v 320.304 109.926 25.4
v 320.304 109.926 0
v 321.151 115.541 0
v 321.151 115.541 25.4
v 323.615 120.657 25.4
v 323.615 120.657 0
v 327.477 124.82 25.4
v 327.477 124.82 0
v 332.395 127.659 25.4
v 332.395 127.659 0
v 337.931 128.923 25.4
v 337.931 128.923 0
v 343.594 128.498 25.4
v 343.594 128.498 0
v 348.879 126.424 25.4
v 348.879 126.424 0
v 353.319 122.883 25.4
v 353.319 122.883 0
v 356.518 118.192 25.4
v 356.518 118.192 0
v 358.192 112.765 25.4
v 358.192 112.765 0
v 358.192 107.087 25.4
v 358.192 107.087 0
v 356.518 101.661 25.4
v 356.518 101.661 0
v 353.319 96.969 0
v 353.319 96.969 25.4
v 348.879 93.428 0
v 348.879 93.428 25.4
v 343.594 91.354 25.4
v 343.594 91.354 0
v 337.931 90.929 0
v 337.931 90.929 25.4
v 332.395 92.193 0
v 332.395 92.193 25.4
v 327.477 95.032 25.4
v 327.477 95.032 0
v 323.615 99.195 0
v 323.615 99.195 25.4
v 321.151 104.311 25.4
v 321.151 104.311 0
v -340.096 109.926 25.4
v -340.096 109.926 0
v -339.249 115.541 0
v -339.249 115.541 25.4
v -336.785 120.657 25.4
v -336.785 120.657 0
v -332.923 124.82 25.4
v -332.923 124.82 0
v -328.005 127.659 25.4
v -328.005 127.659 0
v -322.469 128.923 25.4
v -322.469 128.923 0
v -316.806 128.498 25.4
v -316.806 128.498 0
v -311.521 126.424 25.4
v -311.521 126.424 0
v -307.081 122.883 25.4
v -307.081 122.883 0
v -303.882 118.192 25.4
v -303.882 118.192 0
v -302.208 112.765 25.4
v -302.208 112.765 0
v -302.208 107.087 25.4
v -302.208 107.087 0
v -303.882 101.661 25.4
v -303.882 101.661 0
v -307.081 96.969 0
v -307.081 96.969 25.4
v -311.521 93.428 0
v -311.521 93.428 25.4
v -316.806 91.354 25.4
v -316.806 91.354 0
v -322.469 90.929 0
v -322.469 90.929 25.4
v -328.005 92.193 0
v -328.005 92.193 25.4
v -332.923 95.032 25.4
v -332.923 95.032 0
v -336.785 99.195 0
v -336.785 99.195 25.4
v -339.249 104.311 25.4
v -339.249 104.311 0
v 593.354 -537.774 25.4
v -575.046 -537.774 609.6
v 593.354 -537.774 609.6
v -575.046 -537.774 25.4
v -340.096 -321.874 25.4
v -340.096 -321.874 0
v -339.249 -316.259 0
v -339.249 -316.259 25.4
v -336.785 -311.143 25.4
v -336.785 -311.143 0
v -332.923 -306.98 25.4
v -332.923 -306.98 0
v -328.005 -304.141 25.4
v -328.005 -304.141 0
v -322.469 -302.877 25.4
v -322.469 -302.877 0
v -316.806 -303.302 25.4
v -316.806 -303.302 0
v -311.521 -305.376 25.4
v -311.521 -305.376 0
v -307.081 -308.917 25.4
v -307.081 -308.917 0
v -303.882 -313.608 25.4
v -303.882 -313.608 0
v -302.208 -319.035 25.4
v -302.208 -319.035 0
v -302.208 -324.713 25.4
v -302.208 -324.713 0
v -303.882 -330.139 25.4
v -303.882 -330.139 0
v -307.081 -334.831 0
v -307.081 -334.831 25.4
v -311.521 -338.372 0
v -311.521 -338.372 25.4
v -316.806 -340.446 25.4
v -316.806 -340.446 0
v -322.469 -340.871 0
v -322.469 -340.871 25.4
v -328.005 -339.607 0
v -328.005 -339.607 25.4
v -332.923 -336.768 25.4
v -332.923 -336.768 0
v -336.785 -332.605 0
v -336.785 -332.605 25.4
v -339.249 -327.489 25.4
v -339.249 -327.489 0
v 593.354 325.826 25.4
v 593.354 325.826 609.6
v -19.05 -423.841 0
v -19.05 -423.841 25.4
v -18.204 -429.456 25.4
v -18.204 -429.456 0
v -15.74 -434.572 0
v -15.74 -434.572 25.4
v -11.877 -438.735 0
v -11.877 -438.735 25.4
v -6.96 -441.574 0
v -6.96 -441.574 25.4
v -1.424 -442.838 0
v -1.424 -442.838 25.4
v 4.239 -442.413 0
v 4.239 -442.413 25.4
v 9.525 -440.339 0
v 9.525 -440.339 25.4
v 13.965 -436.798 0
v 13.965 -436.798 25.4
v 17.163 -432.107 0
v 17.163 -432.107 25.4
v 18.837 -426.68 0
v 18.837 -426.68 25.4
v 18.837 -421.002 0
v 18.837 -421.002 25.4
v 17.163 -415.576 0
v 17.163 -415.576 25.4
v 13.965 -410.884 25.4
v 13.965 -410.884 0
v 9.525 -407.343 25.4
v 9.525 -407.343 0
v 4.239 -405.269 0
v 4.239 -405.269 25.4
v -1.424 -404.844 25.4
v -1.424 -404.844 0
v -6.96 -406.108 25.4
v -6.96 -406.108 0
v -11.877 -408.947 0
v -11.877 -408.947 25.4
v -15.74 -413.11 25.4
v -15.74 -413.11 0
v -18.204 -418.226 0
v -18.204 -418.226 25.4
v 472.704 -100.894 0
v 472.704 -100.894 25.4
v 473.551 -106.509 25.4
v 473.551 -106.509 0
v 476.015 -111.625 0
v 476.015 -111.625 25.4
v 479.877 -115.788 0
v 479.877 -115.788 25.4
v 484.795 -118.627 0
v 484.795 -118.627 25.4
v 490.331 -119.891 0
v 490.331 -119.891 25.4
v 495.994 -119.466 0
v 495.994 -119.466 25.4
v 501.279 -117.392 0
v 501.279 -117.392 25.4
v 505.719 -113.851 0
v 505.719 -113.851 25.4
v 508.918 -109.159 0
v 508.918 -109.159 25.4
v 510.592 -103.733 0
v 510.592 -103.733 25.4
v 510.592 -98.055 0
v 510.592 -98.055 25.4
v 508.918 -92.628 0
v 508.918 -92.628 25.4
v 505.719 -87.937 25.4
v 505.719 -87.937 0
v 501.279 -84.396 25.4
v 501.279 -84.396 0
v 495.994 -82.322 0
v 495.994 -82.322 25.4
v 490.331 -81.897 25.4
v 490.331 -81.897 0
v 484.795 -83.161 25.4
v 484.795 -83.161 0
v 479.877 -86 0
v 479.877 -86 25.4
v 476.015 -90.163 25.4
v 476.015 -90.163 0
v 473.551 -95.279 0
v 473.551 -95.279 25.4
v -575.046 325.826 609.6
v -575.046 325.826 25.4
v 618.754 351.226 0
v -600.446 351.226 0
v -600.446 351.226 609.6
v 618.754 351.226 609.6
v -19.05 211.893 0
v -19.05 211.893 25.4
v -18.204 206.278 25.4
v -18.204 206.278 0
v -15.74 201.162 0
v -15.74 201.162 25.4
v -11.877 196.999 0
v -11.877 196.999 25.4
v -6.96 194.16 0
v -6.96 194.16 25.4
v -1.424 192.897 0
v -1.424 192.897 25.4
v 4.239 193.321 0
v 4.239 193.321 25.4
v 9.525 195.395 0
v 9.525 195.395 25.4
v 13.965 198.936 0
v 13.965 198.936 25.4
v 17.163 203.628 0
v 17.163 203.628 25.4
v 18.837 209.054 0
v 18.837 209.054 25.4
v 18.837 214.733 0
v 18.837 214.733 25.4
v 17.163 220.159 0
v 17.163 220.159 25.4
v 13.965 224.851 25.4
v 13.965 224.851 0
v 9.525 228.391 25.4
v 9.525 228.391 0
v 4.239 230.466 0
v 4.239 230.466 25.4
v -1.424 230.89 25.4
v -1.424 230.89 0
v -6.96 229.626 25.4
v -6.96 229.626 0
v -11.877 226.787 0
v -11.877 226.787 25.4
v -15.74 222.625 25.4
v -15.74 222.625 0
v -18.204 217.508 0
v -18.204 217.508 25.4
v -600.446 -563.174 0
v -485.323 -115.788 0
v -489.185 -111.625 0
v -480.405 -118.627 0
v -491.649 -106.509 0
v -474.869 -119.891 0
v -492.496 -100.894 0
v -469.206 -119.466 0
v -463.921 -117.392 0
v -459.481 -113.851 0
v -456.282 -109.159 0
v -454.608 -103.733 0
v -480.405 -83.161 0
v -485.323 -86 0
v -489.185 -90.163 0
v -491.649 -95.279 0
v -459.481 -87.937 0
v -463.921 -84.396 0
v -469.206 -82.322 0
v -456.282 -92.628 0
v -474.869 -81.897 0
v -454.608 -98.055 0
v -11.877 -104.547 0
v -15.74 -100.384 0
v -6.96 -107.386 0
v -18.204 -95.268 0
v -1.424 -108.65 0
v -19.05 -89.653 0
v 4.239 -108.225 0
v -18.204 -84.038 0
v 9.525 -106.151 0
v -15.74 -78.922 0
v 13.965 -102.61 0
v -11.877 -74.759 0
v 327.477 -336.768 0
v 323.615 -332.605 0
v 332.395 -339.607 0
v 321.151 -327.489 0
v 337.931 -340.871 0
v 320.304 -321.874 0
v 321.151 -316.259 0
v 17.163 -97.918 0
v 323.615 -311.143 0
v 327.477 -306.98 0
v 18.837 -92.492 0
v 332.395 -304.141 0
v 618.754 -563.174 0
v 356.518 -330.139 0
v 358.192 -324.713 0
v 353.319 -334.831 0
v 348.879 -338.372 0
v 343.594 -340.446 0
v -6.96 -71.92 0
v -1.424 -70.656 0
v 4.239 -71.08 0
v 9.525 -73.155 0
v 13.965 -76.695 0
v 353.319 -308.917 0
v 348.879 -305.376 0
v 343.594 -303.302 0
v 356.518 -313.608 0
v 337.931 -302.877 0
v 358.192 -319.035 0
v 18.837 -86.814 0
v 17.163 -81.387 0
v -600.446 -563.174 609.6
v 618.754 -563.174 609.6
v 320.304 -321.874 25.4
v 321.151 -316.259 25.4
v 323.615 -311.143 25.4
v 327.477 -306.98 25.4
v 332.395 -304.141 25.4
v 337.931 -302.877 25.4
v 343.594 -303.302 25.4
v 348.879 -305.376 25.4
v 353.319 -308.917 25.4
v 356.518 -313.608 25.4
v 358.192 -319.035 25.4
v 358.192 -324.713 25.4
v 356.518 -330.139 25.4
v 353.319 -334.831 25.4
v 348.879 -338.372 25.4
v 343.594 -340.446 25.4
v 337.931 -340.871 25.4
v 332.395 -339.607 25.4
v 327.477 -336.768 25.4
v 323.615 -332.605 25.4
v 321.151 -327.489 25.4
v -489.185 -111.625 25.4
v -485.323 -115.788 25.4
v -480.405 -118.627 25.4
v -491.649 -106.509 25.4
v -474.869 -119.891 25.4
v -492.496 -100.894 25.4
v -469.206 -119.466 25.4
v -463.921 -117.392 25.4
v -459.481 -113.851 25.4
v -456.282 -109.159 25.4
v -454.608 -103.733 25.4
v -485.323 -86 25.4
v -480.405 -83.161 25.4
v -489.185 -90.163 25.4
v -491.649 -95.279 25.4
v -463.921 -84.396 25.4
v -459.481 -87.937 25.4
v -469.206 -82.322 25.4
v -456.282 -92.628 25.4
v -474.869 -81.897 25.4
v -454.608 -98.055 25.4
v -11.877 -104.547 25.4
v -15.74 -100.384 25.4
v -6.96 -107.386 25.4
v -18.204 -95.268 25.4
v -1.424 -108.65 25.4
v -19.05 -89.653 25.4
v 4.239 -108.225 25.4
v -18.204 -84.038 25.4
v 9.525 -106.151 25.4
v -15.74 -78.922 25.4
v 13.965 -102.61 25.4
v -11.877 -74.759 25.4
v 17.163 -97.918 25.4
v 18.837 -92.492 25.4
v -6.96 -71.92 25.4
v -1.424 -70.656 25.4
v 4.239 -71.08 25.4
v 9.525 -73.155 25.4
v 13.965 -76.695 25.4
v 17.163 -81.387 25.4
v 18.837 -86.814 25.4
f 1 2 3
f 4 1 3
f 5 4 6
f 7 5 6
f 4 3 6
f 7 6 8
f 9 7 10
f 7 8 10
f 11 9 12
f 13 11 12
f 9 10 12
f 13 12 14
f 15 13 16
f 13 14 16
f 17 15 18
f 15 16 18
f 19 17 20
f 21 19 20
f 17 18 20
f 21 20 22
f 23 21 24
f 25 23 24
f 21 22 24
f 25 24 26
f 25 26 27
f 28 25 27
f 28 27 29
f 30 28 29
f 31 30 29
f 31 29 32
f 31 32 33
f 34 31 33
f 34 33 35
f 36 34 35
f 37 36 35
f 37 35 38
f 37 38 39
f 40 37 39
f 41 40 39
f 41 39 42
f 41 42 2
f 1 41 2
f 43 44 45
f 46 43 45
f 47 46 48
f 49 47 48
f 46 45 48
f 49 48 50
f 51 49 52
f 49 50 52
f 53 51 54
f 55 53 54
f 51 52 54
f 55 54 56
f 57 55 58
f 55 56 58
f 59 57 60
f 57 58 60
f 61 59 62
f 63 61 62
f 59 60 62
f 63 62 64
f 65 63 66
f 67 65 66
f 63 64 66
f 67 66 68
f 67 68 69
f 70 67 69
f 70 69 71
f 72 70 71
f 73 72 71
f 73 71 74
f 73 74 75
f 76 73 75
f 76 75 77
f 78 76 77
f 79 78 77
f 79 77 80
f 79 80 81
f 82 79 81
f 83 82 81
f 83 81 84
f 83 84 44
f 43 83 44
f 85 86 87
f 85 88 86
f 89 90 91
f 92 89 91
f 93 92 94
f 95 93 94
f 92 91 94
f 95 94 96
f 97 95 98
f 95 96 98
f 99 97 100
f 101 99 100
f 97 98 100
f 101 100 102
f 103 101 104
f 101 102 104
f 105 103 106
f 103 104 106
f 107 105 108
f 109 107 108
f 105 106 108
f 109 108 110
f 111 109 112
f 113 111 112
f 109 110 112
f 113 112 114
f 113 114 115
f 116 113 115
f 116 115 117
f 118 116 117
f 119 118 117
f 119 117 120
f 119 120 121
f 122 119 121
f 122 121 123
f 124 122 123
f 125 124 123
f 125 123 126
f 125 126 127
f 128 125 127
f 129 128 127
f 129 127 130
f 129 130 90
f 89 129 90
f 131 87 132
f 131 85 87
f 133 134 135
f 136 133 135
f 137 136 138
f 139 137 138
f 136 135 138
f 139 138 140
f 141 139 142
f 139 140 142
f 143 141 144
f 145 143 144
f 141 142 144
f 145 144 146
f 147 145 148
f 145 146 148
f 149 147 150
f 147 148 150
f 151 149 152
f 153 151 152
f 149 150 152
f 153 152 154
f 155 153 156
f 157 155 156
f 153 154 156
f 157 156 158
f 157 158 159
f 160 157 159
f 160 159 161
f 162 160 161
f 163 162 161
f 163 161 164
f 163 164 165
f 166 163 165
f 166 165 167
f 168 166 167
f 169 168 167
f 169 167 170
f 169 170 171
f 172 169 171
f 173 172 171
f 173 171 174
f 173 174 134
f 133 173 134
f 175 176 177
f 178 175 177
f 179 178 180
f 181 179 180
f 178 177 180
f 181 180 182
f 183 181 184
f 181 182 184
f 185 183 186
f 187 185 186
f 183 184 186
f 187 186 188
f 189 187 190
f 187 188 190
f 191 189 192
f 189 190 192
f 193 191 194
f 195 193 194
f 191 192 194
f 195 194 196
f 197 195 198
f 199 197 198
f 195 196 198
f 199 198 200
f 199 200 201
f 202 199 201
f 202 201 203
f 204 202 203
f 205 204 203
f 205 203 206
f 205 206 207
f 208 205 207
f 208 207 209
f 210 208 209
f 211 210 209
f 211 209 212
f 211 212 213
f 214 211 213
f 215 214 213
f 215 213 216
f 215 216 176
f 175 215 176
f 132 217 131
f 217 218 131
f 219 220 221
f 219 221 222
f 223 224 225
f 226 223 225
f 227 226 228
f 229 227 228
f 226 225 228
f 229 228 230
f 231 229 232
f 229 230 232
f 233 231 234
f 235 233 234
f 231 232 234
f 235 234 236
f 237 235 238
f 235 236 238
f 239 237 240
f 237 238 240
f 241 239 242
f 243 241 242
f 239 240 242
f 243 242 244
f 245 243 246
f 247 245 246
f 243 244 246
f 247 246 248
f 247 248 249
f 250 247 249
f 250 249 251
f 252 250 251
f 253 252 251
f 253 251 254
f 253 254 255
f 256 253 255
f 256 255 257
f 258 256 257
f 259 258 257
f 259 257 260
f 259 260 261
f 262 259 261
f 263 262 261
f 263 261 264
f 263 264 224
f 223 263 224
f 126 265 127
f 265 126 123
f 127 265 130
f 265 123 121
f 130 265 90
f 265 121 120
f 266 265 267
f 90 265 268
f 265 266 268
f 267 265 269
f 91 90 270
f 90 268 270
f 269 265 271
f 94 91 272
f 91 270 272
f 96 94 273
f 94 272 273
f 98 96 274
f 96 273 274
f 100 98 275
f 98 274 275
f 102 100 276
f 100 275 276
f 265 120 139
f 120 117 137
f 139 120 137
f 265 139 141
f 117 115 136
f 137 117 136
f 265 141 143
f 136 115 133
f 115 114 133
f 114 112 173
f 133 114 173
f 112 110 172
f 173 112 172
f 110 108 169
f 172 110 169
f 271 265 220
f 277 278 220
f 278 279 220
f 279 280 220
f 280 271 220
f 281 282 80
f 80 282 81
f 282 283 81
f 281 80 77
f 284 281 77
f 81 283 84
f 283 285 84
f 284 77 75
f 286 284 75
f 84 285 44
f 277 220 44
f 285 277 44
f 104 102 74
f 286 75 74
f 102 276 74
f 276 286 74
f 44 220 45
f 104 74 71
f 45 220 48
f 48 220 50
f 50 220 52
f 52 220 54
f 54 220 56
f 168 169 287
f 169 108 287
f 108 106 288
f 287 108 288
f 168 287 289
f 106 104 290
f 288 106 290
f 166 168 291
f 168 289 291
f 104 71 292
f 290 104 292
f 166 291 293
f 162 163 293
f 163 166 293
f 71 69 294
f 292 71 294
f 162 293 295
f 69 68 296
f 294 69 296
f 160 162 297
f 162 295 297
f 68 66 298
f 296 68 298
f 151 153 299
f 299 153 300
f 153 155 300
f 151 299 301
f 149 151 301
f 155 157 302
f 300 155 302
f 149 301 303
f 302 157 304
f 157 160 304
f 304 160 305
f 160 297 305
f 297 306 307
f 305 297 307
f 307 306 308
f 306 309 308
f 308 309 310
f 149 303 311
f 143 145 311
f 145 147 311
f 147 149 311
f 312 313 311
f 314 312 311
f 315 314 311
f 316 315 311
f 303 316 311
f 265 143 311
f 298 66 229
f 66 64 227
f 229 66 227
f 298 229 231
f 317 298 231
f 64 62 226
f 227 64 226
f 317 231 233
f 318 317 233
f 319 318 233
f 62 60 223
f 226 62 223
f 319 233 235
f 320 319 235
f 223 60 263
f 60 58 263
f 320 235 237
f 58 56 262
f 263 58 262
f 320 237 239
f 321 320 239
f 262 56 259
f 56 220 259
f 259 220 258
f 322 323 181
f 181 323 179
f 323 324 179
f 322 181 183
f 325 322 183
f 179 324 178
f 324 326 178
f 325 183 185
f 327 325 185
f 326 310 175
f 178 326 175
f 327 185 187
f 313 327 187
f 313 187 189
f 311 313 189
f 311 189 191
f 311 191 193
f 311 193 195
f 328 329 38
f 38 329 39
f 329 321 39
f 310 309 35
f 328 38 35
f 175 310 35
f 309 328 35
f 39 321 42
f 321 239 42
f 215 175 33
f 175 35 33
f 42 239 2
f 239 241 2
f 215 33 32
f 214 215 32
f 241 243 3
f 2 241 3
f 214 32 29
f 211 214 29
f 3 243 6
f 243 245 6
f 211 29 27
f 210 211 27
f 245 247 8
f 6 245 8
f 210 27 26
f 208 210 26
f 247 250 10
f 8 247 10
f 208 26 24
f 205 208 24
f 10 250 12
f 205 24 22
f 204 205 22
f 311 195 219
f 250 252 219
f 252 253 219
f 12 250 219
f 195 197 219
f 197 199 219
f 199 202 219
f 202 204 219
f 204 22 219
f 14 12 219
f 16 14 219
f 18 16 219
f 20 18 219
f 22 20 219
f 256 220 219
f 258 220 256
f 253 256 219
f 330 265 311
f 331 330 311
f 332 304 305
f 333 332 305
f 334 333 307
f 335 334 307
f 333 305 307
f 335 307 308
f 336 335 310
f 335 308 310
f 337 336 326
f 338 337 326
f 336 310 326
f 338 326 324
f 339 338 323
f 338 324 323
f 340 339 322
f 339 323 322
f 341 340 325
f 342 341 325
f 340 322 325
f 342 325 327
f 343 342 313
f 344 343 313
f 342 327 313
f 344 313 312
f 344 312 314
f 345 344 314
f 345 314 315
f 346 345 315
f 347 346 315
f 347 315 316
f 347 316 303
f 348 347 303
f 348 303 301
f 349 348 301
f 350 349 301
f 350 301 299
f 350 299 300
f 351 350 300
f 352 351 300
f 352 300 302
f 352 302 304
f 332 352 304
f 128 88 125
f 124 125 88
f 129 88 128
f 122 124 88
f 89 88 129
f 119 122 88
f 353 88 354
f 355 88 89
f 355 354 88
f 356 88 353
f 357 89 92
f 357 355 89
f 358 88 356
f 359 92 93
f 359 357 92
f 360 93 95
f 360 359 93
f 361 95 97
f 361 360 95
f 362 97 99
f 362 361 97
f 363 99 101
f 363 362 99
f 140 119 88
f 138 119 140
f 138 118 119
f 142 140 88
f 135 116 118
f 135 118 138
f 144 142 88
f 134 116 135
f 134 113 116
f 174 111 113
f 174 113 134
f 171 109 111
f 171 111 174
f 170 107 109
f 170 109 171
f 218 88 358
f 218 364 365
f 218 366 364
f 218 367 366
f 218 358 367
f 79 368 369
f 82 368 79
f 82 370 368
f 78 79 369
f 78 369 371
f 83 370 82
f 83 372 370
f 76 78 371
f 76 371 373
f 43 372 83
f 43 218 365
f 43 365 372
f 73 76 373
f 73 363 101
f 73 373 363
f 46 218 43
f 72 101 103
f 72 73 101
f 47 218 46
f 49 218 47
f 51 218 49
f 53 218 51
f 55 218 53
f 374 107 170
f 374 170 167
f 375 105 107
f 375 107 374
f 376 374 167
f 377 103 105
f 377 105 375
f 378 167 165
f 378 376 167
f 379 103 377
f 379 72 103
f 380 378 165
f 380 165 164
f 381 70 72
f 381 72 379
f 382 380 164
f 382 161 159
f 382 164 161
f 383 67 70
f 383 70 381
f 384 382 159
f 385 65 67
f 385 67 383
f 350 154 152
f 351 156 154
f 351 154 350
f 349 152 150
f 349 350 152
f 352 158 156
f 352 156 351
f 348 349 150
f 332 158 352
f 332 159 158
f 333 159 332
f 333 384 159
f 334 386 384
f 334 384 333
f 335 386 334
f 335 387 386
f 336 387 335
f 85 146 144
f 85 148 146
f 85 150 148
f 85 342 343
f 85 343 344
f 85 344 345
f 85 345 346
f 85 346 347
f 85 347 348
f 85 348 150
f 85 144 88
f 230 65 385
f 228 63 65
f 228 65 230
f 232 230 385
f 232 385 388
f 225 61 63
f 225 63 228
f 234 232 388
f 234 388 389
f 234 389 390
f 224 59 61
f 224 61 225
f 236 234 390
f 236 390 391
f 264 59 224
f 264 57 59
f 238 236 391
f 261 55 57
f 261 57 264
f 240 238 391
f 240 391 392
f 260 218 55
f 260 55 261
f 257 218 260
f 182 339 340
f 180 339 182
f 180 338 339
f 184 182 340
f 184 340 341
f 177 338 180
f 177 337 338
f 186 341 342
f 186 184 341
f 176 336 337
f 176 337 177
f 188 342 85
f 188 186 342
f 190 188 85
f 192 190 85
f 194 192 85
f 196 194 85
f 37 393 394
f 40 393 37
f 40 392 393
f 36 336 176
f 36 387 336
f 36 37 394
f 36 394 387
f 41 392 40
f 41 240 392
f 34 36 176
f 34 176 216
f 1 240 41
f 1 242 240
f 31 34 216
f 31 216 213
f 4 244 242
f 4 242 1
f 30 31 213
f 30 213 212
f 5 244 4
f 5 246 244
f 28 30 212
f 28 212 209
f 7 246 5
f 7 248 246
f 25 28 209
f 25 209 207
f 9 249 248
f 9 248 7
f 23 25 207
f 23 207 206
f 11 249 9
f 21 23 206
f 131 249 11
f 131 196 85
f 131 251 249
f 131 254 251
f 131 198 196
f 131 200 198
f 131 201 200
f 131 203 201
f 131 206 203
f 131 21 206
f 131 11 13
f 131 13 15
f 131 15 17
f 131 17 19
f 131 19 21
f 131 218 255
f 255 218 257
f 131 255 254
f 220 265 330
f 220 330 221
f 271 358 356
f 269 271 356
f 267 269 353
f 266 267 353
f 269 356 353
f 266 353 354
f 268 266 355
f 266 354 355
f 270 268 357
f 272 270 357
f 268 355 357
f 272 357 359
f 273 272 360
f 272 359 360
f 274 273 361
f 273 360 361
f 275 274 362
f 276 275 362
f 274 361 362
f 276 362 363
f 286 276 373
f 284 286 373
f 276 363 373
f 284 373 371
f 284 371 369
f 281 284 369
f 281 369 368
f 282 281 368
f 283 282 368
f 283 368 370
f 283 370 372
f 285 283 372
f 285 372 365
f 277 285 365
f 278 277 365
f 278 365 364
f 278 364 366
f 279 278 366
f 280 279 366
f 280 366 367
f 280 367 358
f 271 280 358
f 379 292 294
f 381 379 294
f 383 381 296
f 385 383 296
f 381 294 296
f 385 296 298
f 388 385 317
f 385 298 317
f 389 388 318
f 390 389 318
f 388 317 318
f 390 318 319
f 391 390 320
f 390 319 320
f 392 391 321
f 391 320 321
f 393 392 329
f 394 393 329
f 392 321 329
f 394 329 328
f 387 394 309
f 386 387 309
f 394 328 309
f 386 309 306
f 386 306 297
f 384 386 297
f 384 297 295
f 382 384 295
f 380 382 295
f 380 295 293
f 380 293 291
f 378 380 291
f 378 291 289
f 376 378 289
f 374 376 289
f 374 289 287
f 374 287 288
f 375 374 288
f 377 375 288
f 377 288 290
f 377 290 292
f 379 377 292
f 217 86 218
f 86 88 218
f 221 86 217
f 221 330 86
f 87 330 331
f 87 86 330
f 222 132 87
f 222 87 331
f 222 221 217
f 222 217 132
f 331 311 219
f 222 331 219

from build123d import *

# Parameters (mm, degrees)
F0_W     = 1219.2
F0_H     = 914.4
F1_DEPTH = 609.6
F2_T     = -25.4
F4_D     = 38.1
F6_D     = 38.1
F8_D     = 38.1


with BuildPart() as f1:
    # F0 (on Top) → F1 (new body)
    with BuildSketch(Plane.XY):
        with Locations((9.154483676, -105.9739306412)):
            Rectangle(F0_W, F0_H)
    extrude(amount=F1_DEPTH)

    # F2
    f2_openings = [f1.faces().sort_by_distance(p)[0] for p in [
        (9.154484, -105.973931, 609.6),
    ]]
    offset(amount=F2_T, openings=f2_openings)

    # F4 (through all)
    with Locations(Plane.XY.offset(25.4)):
        with Locations((-321.045516324, 109.9260693588), (339.354483676, 109.9260693588), (339.354483676, -321.8739306412), (-321.045516324, -321.8739306412), (0, -89.6527866654)):
            Hole(F4_D / 2)

    # F6 (through all)
    with Locations(Plane(origin=(0, 0, 0), x_dir=(1, 0, 0), z_dir=(0, 0, -1))):
        with Locations((0, -211.8932583313), (0, 423.8411196137)):
            Hole(F6_D / 2)

    # F8 (through all)
    with Locations(Plane(origin=(0, 0, 0), x_dir=(1, 0, 0), z_dir=(0, 0, -1))):
        with Locations((-473.445516324, 100.8939306412), (491.754483676, 100.8939306412)):
            Hole(F8_D / 2)


solid = f1.part
